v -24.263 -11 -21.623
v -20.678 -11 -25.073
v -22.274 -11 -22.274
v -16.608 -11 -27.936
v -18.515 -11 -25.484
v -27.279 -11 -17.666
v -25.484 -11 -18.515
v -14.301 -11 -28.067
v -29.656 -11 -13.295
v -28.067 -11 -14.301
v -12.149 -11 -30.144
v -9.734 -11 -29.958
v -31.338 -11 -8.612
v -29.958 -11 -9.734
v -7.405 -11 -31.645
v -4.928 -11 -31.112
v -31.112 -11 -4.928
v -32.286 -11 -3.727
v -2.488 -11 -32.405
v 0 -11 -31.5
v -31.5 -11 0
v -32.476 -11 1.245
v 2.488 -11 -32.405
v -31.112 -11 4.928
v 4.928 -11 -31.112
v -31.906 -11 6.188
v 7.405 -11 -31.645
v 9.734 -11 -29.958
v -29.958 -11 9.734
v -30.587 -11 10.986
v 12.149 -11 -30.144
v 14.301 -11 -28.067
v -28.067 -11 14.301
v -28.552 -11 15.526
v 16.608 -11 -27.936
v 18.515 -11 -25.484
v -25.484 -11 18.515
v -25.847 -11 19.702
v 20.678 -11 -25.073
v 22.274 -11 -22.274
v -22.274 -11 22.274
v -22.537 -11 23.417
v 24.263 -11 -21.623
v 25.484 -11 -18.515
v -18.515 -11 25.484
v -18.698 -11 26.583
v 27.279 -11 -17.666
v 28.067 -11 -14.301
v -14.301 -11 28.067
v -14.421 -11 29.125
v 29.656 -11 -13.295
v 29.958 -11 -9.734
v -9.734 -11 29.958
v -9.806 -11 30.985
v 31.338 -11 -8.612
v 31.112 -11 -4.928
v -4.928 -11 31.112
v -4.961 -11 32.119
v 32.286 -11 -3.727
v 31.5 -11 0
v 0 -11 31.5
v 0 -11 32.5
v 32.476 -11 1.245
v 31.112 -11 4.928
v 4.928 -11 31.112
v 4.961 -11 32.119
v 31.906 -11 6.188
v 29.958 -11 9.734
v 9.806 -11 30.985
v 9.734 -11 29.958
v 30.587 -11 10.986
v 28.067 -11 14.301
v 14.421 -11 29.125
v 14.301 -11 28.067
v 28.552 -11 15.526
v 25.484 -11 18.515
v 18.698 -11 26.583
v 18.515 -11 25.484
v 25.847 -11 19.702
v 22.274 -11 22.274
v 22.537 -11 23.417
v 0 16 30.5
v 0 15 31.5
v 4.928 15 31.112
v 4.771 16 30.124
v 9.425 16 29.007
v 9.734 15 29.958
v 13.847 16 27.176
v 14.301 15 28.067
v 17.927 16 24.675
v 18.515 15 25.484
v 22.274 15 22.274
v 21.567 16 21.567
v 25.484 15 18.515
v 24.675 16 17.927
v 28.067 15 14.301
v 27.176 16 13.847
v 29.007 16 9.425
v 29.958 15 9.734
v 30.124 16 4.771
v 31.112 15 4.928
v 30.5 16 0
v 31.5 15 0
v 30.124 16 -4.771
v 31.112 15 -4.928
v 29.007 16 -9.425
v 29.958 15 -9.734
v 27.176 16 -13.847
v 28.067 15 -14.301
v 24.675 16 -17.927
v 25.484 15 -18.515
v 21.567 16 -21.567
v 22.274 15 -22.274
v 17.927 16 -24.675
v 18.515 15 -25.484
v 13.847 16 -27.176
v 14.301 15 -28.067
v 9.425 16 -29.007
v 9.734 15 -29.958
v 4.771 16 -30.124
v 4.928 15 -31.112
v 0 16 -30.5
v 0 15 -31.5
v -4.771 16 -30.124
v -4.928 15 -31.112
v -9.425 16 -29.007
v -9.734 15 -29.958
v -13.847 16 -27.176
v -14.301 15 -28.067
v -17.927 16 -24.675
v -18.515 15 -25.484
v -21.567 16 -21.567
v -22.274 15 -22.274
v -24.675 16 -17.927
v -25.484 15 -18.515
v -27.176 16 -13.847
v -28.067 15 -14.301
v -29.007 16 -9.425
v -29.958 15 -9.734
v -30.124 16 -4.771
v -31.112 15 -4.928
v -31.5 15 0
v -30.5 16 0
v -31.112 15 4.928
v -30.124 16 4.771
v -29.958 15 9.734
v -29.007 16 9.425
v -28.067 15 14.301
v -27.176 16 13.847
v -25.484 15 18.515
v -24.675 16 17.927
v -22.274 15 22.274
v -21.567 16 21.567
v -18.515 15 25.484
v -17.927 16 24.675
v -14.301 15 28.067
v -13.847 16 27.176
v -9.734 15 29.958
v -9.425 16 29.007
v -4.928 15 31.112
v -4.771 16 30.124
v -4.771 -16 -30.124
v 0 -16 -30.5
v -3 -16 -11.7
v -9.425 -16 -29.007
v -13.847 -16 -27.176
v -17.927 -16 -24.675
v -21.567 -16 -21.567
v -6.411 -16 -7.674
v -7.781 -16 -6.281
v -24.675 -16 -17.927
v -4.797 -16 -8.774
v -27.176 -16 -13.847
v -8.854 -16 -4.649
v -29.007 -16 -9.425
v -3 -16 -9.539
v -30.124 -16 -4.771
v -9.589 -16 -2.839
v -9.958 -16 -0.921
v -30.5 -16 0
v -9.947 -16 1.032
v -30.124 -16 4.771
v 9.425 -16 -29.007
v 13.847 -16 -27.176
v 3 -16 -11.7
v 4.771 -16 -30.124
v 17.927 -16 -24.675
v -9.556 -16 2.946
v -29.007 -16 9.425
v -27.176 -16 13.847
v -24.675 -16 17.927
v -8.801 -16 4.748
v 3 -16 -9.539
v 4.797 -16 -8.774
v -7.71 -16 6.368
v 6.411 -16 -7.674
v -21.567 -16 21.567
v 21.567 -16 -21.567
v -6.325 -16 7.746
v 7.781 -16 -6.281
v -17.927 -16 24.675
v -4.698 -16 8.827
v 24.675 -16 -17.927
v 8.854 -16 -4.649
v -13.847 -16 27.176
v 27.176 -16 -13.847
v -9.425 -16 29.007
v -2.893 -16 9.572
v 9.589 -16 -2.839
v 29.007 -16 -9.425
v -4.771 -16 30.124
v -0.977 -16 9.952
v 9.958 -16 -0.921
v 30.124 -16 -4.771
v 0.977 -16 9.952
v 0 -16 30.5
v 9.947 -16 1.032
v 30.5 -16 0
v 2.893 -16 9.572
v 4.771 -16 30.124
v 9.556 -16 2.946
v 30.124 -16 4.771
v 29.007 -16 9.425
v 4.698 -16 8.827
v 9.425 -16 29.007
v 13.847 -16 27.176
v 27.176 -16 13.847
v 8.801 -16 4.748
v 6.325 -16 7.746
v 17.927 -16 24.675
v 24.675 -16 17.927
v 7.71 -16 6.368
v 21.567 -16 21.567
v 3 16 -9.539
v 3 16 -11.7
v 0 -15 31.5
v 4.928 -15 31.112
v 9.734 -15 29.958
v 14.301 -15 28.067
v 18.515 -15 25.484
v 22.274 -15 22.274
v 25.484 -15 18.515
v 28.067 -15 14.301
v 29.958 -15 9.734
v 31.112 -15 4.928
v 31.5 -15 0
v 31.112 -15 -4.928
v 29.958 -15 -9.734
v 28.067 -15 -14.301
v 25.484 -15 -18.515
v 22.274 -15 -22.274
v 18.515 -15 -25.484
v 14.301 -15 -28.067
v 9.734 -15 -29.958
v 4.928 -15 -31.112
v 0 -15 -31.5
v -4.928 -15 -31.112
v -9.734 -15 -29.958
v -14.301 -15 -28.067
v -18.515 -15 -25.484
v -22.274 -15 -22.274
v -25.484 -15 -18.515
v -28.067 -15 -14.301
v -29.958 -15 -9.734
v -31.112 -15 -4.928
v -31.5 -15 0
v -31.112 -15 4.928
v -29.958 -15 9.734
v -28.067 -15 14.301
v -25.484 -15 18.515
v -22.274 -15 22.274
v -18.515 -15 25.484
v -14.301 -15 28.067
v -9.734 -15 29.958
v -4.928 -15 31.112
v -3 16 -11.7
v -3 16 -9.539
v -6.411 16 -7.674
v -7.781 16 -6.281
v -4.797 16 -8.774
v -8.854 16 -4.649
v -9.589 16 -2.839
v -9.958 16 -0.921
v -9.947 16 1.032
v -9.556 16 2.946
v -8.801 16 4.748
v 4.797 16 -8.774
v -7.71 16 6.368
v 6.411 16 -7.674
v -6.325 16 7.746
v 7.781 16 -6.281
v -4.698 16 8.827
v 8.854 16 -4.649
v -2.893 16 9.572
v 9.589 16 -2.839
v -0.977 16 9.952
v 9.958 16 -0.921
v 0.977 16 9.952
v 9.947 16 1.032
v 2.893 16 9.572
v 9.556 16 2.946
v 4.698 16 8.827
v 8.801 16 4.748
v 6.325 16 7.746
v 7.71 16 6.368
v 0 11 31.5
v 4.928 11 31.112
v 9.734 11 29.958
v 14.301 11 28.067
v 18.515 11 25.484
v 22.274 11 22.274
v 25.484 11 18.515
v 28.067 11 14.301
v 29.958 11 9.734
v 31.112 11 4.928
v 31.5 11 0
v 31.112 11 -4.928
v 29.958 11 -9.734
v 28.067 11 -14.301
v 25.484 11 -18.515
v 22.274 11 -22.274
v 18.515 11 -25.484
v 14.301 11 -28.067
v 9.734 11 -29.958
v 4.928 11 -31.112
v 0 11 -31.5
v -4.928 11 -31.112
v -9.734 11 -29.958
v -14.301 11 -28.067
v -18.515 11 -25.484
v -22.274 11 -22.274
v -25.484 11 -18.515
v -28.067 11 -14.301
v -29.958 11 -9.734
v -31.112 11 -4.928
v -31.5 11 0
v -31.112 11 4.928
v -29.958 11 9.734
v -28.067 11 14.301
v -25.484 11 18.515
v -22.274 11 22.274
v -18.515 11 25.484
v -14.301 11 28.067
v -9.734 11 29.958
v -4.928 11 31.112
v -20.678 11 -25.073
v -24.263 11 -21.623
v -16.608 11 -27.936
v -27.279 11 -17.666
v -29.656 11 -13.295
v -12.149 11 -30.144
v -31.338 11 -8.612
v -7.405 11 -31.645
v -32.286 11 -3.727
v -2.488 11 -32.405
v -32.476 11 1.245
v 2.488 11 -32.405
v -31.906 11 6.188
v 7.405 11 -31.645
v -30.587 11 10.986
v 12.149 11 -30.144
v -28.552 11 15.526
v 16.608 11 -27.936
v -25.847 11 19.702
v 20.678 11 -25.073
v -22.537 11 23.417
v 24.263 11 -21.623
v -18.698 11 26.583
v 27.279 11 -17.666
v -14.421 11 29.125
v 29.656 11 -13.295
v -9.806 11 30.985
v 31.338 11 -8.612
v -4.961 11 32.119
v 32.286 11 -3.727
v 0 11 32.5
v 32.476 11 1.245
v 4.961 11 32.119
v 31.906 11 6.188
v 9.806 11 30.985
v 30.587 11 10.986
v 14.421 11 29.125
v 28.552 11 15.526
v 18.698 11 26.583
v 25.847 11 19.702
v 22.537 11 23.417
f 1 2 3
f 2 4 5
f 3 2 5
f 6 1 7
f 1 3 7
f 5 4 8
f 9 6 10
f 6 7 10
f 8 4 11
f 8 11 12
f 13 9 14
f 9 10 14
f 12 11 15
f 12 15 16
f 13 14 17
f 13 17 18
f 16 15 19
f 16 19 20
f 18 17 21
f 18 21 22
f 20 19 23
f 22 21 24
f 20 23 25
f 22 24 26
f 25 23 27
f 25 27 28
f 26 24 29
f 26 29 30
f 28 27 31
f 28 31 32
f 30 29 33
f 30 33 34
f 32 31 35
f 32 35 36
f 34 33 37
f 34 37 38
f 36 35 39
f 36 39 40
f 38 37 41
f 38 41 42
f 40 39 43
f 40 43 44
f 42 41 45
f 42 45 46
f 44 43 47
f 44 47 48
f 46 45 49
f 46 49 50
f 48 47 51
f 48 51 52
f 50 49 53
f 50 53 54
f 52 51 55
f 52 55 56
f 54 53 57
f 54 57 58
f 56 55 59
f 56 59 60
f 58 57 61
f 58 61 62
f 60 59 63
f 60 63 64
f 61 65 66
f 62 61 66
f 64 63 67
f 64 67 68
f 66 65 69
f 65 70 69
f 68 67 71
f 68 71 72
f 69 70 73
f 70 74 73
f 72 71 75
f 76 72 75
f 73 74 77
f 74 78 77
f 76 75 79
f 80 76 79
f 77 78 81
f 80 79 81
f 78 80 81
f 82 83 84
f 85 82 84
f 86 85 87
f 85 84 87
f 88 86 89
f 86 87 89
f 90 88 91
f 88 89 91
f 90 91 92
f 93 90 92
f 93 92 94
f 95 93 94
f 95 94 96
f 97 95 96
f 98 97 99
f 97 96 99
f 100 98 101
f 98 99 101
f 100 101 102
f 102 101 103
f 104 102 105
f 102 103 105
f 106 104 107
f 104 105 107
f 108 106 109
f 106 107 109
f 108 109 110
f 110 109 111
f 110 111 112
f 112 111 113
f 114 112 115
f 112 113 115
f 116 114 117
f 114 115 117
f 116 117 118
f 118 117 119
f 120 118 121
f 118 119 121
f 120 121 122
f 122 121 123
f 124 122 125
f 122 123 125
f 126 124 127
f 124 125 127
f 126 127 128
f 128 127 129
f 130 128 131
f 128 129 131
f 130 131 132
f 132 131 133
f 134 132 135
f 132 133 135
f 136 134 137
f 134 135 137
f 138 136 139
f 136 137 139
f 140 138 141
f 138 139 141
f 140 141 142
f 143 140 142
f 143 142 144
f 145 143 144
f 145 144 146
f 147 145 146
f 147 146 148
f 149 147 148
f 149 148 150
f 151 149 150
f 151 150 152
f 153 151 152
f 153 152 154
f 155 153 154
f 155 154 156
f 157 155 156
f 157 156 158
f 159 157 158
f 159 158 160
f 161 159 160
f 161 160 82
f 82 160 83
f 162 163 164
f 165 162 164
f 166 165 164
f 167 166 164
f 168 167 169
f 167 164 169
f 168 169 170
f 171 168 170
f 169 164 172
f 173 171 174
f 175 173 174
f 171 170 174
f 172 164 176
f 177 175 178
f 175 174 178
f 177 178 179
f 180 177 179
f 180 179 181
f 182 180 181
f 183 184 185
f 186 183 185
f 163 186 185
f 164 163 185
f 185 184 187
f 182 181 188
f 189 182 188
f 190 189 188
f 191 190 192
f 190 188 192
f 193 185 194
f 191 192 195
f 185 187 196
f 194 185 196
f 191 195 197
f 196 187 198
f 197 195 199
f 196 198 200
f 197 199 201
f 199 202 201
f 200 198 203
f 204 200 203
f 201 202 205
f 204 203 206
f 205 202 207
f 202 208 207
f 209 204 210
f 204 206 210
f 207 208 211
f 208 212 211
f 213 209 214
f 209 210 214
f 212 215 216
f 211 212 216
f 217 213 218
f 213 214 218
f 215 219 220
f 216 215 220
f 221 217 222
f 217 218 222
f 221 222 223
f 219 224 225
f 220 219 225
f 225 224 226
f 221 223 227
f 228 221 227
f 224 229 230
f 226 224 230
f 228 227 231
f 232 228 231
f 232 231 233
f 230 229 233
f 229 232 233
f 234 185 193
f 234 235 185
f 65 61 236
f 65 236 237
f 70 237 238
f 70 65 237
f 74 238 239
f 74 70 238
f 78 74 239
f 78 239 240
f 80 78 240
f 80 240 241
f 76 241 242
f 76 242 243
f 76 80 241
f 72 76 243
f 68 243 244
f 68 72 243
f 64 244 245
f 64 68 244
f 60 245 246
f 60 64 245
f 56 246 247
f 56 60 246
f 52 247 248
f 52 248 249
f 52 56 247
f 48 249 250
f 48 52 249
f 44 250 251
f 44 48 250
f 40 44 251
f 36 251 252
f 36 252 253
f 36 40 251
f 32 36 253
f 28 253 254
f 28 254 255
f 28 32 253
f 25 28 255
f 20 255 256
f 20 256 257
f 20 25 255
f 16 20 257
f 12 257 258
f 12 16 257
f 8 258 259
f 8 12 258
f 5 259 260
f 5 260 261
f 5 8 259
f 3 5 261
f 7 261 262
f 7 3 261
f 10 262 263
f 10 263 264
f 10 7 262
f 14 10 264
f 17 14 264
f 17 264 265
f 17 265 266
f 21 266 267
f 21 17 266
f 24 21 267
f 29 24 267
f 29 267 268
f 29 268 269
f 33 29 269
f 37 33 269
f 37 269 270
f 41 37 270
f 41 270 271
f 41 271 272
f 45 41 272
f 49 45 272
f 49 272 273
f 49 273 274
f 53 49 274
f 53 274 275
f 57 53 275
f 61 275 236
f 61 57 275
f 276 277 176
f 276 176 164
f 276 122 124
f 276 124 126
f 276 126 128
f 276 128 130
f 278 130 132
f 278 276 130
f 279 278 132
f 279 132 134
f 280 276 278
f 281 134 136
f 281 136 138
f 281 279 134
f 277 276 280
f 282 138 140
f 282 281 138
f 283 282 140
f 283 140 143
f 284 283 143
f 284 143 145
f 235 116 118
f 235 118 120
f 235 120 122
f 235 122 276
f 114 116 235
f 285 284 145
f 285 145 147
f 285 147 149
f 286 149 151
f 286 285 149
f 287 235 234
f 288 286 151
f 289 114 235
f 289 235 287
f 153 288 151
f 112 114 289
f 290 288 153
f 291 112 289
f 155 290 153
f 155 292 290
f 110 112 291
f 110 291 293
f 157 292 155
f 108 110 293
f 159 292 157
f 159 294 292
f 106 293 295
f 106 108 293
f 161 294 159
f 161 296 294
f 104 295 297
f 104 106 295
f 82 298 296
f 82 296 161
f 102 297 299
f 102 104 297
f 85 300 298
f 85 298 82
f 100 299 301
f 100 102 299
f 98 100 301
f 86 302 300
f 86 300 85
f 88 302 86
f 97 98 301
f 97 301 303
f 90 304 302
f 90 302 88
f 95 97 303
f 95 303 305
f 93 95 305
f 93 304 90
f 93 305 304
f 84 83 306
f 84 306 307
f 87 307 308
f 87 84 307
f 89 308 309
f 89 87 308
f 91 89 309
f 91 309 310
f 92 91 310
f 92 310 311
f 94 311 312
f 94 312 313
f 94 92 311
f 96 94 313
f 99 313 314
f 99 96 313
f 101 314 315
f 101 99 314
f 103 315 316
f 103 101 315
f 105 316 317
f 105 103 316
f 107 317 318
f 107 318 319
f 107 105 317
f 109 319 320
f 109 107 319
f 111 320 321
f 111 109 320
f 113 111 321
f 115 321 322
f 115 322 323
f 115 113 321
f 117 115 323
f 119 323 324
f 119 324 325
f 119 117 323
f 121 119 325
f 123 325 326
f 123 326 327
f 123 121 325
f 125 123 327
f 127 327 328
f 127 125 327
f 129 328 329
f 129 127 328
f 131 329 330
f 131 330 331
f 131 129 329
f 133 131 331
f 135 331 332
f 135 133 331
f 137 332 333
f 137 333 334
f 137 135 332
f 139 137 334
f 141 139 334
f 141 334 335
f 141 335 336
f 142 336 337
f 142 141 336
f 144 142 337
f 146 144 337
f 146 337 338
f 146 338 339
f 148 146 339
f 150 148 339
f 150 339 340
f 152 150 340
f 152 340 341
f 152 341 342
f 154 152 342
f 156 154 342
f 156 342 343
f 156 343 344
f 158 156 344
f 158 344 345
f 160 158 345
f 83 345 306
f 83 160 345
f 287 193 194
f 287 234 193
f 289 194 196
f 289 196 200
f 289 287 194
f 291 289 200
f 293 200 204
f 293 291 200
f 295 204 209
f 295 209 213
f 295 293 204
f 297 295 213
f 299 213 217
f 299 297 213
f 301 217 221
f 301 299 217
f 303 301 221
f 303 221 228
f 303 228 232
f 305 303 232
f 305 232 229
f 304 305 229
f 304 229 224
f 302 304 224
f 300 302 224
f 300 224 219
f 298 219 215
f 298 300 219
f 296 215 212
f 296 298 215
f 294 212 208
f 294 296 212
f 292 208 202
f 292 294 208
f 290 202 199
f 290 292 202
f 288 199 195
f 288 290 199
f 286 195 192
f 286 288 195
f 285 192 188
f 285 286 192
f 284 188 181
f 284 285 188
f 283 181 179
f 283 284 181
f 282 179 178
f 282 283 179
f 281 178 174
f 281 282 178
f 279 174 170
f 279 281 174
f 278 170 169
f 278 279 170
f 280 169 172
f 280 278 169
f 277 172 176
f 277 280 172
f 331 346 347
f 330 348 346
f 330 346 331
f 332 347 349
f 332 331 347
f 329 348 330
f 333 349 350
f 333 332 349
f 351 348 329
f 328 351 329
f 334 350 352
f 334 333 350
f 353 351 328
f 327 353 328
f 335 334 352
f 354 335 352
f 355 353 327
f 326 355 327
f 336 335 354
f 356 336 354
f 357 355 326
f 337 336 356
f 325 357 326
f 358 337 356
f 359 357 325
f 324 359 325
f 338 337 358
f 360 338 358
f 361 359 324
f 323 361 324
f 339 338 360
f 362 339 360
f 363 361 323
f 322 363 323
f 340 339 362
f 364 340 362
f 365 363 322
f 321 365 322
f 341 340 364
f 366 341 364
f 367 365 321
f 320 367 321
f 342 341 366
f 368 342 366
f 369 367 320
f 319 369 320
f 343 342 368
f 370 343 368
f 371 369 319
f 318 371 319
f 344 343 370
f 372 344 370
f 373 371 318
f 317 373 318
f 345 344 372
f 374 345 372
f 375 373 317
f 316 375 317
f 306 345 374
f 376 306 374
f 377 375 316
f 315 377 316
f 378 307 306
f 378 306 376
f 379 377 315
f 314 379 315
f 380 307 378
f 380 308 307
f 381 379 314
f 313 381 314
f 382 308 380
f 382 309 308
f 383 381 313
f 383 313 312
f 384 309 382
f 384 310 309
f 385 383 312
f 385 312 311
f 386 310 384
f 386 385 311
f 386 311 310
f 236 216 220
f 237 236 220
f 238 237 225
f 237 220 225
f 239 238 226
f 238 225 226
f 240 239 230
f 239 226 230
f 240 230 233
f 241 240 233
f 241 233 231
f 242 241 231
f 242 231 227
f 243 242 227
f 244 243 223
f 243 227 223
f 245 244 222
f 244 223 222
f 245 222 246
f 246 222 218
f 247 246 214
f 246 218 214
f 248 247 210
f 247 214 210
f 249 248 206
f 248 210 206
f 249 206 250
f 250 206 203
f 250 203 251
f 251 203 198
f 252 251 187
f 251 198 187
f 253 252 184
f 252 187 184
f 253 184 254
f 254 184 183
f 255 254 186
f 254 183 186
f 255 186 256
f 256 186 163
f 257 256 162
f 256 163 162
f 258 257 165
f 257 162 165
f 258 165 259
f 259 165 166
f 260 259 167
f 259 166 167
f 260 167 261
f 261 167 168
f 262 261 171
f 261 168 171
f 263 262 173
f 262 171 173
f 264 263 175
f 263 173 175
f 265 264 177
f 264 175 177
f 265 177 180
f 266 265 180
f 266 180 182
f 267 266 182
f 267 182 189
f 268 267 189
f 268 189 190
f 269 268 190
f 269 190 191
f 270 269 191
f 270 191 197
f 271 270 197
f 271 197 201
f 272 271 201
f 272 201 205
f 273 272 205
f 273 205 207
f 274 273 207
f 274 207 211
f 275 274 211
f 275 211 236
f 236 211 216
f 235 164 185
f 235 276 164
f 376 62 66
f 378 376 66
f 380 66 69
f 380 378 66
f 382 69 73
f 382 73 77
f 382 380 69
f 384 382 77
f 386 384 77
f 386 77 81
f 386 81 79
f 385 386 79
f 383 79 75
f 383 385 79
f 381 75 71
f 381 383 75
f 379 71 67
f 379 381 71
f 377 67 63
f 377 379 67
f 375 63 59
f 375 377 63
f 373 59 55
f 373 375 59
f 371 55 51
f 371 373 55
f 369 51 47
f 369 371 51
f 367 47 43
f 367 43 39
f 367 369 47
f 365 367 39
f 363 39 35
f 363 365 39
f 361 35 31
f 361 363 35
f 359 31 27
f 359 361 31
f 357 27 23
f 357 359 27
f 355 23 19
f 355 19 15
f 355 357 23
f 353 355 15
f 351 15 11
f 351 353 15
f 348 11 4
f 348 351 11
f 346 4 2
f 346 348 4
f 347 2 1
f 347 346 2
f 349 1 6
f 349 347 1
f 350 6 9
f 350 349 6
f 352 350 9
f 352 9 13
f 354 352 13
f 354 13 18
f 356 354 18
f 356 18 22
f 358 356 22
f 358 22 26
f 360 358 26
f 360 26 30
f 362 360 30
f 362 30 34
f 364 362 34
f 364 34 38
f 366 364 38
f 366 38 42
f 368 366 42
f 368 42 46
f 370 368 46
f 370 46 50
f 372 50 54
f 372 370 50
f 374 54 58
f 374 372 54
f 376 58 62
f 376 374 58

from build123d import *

# Parameters (mm, degrees)
SKETCH_1_R      = 31.5
EXTRUDE_1_DEPTH = 16
SKETCH_2_R      = 32.5
SKETCH_2_R_2    = 31.5
EXTRUDE_2_DEPTH = 11
CHAMFER_1_SIZE  = 1


with BuildPart() as part:
    # 草图1 → 凸台-拉伸1 (new, symmetric)
    with BuildSketch(Plane(origin=(0, 0, 0), x_dir=(1, 0, 0), z_dir=(0, 1, 0))):
        with Locations(Location((0, 0, 0), (0, 0, 270))):
            Circle(SKETCH_1_R)
        with BuildLine():
            Line((-3, 9.539392014), (-3, 11.7))
            Line((-3, 11.7), (3, 11.7))
            Line((3, 11.7), (3, 9.539392014))
            ThreePointArc((3, 9.539392014), (0, -10), (-3, 9.539392014))
        make_face(mode=Mode.SUBTRACT)
    extrude(amount=EXTRUDE_1_DEPTH, both=True)

    # 草图2 → 凸台-拉伸2 (add, symmetric)
    with BuildSketch(Plane(origin=(0, 0, 0), x_dir=(1, 0, 0), z_dir=(0, 1, 0))):
        with Locations(Location((0, 0, 0), (0, 0, 270))):
            Circle(SKETCH_2_R)
        with Locations(Location((0, 0, 0), (0, 0, 270))):
            Circle(SKETCH_2_R_2, mode=Mode.SUBTRACT)
    extrude(amount=EXTRUDE_2_DEPTH, both=True)

    # 倒角1
    chamfer_1_edges = [part.edges().sort_by_distance(p)[0] for p in [
        (0, -16, -31.5),
        (0, 16, -31.5),
    ]]
    chamfer(chamfer_1_edges, length=CHAMFER_1_SIZE)


solid = part.part
